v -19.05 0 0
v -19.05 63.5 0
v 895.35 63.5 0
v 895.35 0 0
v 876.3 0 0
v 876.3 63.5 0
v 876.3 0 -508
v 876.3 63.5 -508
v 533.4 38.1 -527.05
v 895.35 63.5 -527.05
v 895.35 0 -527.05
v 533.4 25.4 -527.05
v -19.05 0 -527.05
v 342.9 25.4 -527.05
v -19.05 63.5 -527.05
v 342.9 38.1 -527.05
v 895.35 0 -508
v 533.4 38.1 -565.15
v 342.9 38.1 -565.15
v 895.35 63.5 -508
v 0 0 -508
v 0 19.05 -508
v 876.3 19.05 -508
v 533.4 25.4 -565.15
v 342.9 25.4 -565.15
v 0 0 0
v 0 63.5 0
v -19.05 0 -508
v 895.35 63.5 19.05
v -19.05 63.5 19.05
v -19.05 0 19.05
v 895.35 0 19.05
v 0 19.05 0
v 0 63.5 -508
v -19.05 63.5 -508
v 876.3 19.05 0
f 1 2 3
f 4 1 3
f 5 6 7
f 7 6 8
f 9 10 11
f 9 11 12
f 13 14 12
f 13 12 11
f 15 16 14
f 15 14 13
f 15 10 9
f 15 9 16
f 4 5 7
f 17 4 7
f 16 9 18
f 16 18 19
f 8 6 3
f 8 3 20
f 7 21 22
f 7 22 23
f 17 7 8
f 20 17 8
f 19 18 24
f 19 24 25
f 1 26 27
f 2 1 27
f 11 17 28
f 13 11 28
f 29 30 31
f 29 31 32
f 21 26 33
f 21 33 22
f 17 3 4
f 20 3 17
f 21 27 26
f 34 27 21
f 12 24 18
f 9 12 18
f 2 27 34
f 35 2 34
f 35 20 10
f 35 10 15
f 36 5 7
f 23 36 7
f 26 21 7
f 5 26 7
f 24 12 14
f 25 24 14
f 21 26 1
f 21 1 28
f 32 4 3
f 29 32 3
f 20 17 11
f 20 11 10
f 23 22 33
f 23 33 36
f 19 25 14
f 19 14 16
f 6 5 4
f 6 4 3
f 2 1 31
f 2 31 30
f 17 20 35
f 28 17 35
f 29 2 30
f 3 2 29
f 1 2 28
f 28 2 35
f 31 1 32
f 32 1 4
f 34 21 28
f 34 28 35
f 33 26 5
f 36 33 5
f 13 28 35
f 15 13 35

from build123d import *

# Parameters (mm, degrees)
SKETCH1_W           = 876.3
SKETCH1_H           = 508
BOSS_EXTRUDE1_DEPTH = 19.05
SKETCH2_W           = 914.4
SKETCH2_H           = 63.5
BOSS_EXTRUDE2_DEPTH = 19.05
SKETCH4_W           = 914.4
SKETCH4_H           = 63.5
BOSS_EXTRUDE3_DEPTH = 19.05
SKETCH5_W           = 508
SKETCH5_H           = 63.5
BOSS_EXTRUDE4_DEPTH = 19.05
SKETCH6_W           = 508
SKETCH6_H           = 63.5
BOSS_EXTRUDE5_DEPTH = 19.05
SKETCH7_W           = 190.5
SKETCH7_H           = 12.7
BOSS_EXTRUDE6_DEPTH = 38.1


with BuildPart() as part:
    # Sketch1 → Boss-Extrude1 (new body)
    with BuildSketch(Plane(origin=(0, 0, 0), x_dir=(1, 0, 0), z_dir=(0, 1, 0))):
        with Locations((438.15, 254)):
            Rectangle(SKETCH1_W, SKETCH1_H)
    extrude(amount=BOSS_EXTRUDE1_DEPTH)


with BuildPart() as body_2:
    # Sketch2 → Boss-Extrude2 (new body)
    with BuildSketch(Plane.XY):
        with Locations((438.15, 31.75)):
            Rectangle(SKETCH2_W, SKETCH2_H)
    extrude(amount=BOSS_EXTRUDE2_DEPTH)


with BuildPart() as body_3:
    # Sketch4 → Boss-Extrude3 (new body)
    with BuildSketch(Plane(origin=(0, 0, -508), x_dir=(-1, 0, 0), z_dir=(0, 0, -1))):
        with Locations((-438.15, 31.75)):
            Rectangle(SKETCH4_W, SKETCH4_H)
    extrude(amount=BOSS_EXTRUDE3_DEPTH)

    # Sketch7 → Boss-Extrude6 (add)
    with BuildSketch(Plane(origin=(0, 0, -527.05), x_dir=(-1, 0, 0), z_dir=(0, 0, -1))):
        with Locations((-438.15, 31.75)):
            Rectangle(SKETCH7_W, SKETCH7_H)
    extrude(amount=BOSS_EXTRUDE6_DEPTH)


with BuildPart() as body_4:
    # Sketch5 → Boss-Extrude4 (new body)
    with BuildSketch(Plane(origin=(0, 0, 0), x_dir=(0, 0, -1), z_dir=(1, 0, 0))):
        with Locations((254, 31.75)):
            Rectangle(SKETCH5_W, SKETCH5_H)
    extrude(amount=-BOSS_EXTRUDE4_DEPTH)


with BuildPart() as body_5:
    # Sketch6 → Boss-Extrude5 (new body)
    with BuildSketch(Plane(origin=(876.3, 0, 0), x_dir=(0, 0, -1), z_dir=(1, 0, 0))):
        with Locations((254, 31.75)):
            Rectangle(SKETCH6_W, SKETCH6_H)
    extrude(amount=BOSS_EXTRUDE5_DEPTH)


solid = Compound([part.part, body_2.part, body_3.part, body_4.part, body_5.part])
